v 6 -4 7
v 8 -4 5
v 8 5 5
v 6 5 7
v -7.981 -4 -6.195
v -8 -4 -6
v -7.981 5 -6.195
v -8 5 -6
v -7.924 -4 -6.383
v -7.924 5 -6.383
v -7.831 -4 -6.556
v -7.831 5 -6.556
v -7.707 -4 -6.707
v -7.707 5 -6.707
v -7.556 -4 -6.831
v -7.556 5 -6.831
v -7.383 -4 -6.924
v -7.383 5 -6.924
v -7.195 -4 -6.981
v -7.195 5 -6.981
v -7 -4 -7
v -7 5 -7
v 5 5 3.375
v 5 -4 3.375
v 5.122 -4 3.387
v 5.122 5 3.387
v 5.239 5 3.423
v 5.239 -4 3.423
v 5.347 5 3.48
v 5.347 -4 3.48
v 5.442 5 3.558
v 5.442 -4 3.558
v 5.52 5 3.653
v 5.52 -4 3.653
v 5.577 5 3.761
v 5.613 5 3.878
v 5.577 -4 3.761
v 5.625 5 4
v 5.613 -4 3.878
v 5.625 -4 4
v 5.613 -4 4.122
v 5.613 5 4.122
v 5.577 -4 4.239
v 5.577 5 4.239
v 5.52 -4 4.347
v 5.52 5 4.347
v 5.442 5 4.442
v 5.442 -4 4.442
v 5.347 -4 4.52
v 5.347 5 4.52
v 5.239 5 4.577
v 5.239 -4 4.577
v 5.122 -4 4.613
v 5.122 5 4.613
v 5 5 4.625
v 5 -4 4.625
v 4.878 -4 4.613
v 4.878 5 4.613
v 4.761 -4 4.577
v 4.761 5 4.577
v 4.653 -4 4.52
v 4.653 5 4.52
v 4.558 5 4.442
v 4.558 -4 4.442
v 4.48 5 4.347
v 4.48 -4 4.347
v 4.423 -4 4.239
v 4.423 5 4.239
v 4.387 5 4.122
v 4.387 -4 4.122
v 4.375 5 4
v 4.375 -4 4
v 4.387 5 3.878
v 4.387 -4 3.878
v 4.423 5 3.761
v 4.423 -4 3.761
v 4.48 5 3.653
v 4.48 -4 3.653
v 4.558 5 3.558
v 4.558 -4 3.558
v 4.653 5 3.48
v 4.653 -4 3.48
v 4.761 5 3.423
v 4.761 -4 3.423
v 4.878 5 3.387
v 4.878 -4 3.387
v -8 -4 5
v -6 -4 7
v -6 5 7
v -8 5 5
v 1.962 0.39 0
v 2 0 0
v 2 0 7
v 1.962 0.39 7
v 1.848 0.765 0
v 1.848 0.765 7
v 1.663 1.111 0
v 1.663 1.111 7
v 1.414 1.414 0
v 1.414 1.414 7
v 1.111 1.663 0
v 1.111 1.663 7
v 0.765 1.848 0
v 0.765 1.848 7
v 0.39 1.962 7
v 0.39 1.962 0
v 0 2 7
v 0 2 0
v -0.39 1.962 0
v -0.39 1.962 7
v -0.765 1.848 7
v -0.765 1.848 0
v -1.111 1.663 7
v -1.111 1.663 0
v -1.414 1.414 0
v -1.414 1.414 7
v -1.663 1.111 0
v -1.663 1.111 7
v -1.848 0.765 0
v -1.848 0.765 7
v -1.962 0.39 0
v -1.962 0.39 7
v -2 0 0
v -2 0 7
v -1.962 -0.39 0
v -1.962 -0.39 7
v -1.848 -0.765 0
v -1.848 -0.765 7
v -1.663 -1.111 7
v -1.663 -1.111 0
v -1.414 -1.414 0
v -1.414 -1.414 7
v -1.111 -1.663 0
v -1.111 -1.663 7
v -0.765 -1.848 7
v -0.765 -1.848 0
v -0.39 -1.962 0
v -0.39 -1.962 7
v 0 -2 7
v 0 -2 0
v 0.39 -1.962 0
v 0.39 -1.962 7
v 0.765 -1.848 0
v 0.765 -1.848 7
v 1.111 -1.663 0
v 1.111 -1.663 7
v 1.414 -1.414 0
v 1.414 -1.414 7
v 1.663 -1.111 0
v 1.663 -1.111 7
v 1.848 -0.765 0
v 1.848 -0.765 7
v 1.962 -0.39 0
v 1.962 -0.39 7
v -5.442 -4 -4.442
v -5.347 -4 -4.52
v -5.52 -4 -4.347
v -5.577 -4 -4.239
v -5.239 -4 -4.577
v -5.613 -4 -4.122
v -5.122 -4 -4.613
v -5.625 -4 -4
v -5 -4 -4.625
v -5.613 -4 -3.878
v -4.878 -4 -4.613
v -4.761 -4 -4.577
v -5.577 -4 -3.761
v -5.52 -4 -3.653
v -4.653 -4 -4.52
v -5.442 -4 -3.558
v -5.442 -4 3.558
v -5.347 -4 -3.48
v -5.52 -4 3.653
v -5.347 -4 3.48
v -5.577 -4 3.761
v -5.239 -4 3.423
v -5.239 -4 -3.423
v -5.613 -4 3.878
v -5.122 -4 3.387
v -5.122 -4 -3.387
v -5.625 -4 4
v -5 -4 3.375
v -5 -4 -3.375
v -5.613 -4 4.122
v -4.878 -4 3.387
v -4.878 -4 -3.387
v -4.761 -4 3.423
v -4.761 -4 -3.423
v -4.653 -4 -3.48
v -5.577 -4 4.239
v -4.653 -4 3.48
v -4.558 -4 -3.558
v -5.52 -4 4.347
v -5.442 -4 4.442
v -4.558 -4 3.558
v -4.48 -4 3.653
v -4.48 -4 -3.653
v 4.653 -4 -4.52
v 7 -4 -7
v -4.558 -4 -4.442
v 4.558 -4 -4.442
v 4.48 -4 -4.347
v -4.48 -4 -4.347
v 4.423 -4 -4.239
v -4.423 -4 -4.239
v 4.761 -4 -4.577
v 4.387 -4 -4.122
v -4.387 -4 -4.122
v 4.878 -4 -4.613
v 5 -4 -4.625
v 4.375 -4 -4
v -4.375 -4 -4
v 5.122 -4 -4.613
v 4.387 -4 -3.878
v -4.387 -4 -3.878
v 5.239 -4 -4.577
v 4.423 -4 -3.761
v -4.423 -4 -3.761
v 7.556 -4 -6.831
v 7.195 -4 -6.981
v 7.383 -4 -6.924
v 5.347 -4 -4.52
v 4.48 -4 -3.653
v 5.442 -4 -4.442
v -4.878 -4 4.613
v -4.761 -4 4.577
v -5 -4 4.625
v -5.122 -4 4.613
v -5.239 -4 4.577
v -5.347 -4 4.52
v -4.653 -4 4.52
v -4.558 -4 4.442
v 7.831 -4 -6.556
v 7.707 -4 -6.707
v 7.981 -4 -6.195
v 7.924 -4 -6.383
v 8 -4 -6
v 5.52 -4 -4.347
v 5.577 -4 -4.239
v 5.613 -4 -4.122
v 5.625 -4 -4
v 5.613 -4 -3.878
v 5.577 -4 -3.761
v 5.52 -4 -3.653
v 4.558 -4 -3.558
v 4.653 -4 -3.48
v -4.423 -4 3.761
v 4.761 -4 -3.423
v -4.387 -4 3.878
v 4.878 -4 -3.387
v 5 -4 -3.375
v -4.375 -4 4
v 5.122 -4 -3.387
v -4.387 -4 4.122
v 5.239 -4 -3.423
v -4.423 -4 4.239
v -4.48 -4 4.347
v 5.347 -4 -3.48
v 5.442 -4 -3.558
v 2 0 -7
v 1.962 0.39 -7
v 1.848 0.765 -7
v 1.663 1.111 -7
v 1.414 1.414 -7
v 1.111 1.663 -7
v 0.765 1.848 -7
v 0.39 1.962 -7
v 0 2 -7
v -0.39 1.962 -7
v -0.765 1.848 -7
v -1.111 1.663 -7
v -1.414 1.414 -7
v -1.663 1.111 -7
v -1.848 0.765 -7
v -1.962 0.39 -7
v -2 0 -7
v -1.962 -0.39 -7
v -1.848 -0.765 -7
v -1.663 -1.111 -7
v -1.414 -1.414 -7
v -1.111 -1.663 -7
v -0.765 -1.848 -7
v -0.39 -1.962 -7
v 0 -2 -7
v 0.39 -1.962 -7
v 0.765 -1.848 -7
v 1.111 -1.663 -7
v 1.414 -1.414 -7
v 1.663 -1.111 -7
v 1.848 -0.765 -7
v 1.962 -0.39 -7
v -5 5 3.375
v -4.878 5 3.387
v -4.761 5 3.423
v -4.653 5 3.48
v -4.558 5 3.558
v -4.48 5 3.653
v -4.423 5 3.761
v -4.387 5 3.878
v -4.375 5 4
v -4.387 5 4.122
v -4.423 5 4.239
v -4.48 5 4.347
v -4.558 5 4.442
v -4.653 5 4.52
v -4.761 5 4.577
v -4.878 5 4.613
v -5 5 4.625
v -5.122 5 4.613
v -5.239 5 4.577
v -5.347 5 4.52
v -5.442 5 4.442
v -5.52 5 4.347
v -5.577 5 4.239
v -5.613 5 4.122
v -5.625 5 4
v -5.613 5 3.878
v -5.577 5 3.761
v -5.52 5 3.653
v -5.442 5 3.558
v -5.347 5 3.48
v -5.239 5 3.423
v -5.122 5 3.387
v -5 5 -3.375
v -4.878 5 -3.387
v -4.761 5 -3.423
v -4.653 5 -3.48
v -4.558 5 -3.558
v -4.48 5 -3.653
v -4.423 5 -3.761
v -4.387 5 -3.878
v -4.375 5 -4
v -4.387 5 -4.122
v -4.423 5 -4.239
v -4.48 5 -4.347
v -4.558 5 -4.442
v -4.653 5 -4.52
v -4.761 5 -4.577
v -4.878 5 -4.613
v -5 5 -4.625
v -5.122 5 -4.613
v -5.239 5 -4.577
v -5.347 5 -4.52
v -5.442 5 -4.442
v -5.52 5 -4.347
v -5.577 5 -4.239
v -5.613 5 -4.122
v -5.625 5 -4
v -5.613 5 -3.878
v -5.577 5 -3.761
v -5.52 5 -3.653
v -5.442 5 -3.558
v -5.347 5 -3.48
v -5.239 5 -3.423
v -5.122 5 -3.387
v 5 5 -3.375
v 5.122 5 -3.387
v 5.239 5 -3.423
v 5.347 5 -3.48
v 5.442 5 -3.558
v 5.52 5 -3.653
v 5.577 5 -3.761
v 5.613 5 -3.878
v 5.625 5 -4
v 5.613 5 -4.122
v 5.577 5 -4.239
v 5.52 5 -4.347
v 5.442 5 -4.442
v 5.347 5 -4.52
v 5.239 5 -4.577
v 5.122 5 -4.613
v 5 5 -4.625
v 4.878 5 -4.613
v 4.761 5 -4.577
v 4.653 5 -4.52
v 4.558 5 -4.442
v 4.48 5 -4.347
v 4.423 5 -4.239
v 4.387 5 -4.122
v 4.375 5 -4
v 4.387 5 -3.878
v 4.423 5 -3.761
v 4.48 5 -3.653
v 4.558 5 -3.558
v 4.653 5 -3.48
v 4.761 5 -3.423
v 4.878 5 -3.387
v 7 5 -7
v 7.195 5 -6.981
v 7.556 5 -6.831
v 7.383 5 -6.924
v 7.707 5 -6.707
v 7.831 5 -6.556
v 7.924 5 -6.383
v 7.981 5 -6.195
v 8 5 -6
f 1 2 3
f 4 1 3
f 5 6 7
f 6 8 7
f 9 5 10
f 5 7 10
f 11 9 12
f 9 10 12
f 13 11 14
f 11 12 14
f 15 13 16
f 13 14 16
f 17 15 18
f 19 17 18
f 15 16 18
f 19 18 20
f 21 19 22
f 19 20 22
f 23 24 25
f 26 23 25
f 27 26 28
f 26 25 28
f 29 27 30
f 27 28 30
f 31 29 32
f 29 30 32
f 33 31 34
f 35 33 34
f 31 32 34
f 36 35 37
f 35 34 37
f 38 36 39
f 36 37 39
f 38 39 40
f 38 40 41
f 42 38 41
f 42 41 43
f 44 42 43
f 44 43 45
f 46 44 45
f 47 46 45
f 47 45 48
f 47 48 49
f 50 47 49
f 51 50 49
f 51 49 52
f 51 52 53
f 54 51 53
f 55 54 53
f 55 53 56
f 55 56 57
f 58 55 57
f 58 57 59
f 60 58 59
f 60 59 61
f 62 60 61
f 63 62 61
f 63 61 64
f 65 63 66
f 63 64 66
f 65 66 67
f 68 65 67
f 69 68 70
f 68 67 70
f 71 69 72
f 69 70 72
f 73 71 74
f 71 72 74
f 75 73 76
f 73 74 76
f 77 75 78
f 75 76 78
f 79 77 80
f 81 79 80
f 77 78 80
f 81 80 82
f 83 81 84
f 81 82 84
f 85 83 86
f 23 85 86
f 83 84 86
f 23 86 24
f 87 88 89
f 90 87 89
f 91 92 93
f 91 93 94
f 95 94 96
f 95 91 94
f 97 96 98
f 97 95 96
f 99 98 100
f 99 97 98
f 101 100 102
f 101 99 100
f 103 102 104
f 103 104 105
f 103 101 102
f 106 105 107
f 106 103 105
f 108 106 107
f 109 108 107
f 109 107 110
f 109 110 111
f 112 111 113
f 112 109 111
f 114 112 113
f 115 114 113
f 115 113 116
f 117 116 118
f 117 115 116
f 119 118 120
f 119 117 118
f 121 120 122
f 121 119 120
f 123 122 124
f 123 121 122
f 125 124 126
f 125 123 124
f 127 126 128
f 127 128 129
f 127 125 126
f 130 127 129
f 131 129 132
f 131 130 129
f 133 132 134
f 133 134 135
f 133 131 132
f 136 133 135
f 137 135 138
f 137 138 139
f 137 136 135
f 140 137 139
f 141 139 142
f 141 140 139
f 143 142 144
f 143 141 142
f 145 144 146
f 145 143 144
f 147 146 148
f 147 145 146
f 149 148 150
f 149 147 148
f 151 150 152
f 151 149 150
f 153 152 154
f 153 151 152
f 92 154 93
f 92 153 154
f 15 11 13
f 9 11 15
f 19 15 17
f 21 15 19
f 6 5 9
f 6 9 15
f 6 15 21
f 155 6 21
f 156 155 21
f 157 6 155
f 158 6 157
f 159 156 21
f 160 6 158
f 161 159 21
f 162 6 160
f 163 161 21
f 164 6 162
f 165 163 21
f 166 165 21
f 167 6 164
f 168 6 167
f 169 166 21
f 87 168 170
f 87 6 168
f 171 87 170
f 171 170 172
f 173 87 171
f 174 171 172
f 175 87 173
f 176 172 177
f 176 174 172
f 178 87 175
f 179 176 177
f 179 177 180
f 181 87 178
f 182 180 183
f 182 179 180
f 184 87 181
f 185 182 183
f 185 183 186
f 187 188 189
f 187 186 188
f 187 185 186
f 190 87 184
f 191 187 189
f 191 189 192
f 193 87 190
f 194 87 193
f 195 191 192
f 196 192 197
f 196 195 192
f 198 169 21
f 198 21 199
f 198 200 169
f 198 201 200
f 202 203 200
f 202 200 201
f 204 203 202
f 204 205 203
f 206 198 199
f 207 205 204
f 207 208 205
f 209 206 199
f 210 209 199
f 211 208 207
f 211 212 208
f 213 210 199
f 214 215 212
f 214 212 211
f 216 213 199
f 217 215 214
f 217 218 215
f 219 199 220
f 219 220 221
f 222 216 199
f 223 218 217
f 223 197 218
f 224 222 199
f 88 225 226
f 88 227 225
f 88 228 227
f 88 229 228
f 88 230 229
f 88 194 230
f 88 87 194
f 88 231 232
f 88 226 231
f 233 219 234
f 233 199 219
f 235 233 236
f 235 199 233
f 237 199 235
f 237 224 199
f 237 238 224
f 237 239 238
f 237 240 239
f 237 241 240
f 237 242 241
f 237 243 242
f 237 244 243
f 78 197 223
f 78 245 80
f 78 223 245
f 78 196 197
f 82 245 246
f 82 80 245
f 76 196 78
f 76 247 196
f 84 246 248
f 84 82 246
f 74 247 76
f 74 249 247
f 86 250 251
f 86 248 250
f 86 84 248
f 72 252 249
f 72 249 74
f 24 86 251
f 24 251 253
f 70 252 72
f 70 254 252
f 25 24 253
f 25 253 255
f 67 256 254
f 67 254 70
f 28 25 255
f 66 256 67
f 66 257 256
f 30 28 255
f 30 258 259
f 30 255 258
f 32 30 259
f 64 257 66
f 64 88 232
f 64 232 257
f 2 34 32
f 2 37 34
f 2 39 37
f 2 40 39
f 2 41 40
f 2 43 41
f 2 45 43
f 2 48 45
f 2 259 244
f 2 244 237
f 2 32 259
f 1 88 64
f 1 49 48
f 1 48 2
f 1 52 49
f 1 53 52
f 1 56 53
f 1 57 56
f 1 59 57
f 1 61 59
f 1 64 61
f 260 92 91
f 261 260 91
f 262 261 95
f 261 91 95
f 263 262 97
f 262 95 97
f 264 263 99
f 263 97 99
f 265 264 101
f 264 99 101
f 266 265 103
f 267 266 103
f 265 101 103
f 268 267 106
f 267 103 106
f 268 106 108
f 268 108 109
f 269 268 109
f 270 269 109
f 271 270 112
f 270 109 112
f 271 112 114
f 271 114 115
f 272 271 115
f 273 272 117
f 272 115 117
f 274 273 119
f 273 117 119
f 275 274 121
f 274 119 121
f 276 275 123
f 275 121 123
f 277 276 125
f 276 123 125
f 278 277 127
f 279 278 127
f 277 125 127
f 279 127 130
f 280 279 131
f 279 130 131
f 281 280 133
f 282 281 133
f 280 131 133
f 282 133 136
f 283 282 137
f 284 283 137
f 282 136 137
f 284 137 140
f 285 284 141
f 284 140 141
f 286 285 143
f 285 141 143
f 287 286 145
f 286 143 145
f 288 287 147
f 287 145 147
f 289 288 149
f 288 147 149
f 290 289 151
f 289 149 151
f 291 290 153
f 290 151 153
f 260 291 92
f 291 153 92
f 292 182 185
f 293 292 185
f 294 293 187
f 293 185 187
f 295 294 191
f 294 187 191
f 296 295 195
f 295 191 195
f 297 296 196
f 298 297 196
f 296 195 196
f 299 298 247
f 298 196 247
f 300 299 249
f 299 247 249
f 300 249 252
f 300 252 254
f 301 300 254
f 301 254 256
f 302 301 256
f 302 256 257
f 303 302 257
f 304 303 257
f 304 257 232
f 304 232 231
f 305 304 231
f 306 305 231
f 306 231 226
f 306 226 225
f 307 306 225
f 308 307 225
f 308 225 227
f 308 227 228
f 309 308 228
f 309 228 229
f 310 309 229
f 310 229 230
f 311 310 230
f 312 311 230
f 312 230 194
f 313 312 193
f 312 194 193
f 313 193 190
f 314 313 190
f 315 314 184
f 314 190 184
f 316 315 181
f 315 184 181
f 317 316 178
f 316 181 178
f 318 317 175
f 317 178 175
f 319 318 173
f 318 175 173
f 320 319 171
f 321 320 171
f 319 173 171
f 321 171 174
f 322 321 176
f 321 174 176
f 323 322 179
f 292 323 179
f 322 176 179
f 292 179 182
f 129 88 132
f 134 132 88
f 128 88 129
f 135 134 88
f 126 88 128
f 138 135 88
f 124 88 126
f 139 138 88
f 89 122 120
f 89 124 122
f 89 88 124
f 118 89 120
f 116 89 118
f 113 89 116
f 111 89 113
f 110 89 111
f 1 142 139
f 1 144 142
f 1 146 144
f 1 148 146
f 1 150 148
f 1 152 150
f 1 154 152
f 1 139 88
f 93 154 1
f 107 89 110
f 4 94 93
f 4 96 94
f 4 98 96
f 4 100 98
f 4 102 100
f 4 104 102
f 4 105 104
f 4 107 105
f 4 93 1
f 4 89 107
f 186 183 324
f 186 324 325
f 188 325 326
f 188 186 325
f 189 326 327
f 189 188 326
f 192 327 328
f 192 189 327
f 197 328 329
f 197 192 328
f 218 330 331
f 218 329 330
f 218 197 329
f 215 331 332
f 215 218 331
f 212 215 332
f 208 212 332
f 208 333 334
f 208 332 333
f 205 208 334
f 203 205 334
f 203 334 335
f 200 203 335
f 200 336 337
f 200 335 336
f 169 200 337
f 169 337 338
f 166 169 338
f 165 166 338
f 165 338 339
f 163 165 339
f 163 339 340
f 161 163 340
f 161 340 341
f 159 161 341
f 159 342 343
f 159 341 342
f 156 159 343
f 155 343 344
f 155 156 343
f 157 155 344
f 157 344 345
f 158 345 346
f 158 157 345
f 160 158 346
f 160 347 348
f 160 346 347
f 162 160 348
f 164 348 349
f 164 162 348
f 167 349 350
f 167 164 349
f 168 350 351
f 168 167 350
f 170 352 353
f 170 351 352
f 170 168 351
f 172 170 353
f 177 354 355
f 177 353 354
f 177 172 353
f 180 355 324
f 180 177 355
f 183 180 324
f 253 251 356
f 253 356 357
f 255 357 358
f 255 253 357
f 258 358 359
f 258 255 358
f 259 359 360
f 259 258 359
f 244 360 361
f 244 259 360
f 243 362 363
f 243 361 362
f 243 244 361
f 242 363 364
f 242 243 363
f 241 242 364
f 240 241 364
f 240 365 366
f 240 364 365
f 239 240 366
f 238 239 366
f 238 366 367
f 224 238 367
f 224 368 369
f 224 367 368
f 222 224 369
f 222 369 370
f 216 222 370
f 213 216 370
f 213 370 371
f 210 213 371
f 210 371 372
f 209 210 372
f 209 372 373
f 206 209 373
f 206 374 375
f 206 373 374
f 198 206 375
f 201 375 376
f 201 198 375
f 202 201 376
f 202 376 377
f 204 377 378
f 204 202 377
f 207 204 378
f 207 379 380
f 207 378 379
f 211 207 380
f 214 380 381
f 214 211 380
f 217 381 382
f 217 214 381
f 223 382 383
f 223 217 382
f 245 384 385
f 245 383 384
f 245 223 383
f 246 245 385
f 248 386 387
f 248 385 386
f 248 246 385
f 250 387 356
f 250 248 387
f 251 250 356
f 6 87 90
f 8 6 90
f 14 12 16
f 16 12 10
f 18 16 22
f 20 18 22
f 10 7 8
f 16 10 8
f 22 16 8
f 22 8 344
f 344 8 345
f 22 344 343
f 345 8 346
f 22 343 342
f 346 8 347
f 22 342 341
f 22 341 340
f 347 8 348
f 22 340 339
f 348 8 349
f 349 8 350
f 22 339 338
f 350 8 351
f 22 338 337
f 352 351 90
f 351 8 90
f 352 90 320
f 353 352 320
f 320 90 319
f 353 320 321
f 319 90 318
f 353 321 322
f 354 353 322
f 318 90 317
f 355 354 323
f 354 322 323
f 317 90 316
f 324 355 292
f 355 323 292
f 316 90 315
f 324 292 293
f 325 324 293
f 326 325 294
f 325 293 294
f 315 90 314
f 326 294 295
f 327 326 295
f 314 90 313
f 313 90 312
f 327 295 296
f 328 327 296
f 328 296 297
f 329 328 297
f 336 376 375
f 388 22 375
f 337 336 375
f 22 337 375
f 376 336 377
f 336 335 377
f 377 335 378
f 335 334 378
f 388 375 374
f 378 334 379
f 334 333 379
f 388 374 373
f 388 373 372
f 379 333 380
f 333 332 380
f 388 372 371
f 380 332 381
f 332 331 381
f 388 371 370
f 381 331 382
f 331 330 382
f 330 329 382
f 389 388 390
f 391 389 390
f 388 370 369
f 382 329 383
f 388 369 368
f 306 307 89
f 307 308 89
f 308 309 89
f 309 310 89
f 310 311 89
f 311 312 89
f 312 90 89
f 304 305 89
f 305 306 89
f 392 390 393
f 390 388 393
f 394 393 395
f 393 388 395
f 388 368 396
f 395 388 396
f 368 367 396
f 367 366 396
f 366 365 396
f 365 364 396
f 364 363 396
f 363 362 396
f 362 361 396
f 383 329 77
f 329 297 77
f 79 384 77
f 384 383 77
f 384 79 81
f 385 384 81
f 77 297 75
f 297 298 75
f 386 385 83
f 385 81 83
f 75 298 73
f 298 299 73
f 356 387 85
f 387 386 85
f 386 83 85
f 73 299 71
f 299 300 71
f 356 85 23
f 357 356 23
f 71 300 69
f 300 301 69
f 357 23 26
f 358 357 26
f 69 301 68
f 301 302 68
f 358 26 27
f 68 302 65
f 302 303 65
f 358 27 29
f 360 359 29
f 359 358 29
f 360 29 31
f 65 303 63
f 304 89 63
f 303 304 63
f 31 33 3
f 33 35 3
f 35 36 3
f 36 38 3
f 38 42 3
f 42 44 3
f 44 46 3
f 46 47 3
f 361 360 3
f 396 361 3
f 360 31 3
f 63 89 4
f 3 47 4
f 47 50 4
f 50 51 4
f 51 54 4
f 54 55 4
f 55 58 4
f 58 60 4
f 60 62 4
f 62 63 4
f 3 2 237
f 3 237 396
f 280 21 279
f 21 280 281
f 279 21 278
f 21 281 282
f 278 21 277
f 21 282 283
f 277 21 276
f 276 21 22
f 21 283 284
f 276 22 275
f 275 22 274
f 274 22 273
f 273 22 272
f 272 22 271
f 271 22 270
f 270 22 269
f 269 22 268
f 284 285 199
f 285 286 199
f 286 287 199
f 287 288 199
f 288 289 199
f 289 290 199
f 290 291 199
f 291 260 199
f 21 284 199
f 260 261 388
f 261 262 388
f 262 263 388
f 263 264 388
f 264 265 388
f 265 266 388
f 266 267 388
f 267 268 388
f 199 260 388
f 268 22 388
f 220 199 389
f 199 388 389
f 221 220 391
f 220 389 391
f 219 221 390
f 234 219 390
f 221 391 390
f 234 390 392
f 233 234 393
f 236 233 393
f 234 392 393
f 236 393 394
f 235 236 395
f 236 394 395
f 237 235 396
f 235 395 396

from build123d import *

# Parameters (mm, degrees)
ESQUISSE1_W         = 16
ESQUISSE1_H         = 9
ESQUISSE1_R         = 2
BOSS_EXTRU_1_DEPTH  = 7
TROU_TARAUD_M1_61_D = 1.25
CHANFREIN1_SIZE     = 2
CONG_1_R            = 1


with BuildPart() as part:
    # Esquisse1 → Boss.-Extru.1 (new body)
    with BuildSketch(Plane.XY):
        with Locations((0, 0.5)):
            Rectangle(ESQUISSE1_W, ESQUISSE1_H)
        Circle(ESQUISSE1_R, mode=Mode.SUBTRACT)
    boss_extru_1 = extrude(amount=BOSS_EXTRU_1_DEPTH)

    # Trou taraudé M1.61 (through all)
    with Locations(Plane(origin=(-5, 5, 4), x_dir=(0, 0, 1), z_dir=(0, 1, 0))):
        with Locations((0, 0), (0, 10)):
            trou_taraud_m1_61 = Hole(TROU_TARAUD_M1_61_D / 2)

    # Symétrie1: Boss.-Extru.1, Trou taraudé M1.61 across plane
    add(boss_extru_1.mirror(Plane(origin=(-8, -4, 0), x_dir=(1, 0, 0), z_dir=(0, 0, 1))))
    add(trou_taraud_m1_61.mirror(Plane(origin=(-8, -4, 0), x_dir=(1, 0, 0), z_dir=(0, 0, 1))), mode=Mode.SUBTRACT)

    # Chanfrein1
    chanfrein1_edges = [part.edges().sort_by_distance(p)[0] for p in [
        (8, 0.5, 7),
        (-8, 0.5, 7),
    ]]
    chamfer(chanfrein1_edges, length=CHANFREIN1_SIZE)

    # Congé1
    cong_1_edges = [part.edges().sort_by_distance(p)[0] for p in [
        (-8, 0.5, -7),
        (8, 0.5, -7),
    ]]
    fillet(cong_1_edges, radius=CONG_1_R)


solid = part.part
